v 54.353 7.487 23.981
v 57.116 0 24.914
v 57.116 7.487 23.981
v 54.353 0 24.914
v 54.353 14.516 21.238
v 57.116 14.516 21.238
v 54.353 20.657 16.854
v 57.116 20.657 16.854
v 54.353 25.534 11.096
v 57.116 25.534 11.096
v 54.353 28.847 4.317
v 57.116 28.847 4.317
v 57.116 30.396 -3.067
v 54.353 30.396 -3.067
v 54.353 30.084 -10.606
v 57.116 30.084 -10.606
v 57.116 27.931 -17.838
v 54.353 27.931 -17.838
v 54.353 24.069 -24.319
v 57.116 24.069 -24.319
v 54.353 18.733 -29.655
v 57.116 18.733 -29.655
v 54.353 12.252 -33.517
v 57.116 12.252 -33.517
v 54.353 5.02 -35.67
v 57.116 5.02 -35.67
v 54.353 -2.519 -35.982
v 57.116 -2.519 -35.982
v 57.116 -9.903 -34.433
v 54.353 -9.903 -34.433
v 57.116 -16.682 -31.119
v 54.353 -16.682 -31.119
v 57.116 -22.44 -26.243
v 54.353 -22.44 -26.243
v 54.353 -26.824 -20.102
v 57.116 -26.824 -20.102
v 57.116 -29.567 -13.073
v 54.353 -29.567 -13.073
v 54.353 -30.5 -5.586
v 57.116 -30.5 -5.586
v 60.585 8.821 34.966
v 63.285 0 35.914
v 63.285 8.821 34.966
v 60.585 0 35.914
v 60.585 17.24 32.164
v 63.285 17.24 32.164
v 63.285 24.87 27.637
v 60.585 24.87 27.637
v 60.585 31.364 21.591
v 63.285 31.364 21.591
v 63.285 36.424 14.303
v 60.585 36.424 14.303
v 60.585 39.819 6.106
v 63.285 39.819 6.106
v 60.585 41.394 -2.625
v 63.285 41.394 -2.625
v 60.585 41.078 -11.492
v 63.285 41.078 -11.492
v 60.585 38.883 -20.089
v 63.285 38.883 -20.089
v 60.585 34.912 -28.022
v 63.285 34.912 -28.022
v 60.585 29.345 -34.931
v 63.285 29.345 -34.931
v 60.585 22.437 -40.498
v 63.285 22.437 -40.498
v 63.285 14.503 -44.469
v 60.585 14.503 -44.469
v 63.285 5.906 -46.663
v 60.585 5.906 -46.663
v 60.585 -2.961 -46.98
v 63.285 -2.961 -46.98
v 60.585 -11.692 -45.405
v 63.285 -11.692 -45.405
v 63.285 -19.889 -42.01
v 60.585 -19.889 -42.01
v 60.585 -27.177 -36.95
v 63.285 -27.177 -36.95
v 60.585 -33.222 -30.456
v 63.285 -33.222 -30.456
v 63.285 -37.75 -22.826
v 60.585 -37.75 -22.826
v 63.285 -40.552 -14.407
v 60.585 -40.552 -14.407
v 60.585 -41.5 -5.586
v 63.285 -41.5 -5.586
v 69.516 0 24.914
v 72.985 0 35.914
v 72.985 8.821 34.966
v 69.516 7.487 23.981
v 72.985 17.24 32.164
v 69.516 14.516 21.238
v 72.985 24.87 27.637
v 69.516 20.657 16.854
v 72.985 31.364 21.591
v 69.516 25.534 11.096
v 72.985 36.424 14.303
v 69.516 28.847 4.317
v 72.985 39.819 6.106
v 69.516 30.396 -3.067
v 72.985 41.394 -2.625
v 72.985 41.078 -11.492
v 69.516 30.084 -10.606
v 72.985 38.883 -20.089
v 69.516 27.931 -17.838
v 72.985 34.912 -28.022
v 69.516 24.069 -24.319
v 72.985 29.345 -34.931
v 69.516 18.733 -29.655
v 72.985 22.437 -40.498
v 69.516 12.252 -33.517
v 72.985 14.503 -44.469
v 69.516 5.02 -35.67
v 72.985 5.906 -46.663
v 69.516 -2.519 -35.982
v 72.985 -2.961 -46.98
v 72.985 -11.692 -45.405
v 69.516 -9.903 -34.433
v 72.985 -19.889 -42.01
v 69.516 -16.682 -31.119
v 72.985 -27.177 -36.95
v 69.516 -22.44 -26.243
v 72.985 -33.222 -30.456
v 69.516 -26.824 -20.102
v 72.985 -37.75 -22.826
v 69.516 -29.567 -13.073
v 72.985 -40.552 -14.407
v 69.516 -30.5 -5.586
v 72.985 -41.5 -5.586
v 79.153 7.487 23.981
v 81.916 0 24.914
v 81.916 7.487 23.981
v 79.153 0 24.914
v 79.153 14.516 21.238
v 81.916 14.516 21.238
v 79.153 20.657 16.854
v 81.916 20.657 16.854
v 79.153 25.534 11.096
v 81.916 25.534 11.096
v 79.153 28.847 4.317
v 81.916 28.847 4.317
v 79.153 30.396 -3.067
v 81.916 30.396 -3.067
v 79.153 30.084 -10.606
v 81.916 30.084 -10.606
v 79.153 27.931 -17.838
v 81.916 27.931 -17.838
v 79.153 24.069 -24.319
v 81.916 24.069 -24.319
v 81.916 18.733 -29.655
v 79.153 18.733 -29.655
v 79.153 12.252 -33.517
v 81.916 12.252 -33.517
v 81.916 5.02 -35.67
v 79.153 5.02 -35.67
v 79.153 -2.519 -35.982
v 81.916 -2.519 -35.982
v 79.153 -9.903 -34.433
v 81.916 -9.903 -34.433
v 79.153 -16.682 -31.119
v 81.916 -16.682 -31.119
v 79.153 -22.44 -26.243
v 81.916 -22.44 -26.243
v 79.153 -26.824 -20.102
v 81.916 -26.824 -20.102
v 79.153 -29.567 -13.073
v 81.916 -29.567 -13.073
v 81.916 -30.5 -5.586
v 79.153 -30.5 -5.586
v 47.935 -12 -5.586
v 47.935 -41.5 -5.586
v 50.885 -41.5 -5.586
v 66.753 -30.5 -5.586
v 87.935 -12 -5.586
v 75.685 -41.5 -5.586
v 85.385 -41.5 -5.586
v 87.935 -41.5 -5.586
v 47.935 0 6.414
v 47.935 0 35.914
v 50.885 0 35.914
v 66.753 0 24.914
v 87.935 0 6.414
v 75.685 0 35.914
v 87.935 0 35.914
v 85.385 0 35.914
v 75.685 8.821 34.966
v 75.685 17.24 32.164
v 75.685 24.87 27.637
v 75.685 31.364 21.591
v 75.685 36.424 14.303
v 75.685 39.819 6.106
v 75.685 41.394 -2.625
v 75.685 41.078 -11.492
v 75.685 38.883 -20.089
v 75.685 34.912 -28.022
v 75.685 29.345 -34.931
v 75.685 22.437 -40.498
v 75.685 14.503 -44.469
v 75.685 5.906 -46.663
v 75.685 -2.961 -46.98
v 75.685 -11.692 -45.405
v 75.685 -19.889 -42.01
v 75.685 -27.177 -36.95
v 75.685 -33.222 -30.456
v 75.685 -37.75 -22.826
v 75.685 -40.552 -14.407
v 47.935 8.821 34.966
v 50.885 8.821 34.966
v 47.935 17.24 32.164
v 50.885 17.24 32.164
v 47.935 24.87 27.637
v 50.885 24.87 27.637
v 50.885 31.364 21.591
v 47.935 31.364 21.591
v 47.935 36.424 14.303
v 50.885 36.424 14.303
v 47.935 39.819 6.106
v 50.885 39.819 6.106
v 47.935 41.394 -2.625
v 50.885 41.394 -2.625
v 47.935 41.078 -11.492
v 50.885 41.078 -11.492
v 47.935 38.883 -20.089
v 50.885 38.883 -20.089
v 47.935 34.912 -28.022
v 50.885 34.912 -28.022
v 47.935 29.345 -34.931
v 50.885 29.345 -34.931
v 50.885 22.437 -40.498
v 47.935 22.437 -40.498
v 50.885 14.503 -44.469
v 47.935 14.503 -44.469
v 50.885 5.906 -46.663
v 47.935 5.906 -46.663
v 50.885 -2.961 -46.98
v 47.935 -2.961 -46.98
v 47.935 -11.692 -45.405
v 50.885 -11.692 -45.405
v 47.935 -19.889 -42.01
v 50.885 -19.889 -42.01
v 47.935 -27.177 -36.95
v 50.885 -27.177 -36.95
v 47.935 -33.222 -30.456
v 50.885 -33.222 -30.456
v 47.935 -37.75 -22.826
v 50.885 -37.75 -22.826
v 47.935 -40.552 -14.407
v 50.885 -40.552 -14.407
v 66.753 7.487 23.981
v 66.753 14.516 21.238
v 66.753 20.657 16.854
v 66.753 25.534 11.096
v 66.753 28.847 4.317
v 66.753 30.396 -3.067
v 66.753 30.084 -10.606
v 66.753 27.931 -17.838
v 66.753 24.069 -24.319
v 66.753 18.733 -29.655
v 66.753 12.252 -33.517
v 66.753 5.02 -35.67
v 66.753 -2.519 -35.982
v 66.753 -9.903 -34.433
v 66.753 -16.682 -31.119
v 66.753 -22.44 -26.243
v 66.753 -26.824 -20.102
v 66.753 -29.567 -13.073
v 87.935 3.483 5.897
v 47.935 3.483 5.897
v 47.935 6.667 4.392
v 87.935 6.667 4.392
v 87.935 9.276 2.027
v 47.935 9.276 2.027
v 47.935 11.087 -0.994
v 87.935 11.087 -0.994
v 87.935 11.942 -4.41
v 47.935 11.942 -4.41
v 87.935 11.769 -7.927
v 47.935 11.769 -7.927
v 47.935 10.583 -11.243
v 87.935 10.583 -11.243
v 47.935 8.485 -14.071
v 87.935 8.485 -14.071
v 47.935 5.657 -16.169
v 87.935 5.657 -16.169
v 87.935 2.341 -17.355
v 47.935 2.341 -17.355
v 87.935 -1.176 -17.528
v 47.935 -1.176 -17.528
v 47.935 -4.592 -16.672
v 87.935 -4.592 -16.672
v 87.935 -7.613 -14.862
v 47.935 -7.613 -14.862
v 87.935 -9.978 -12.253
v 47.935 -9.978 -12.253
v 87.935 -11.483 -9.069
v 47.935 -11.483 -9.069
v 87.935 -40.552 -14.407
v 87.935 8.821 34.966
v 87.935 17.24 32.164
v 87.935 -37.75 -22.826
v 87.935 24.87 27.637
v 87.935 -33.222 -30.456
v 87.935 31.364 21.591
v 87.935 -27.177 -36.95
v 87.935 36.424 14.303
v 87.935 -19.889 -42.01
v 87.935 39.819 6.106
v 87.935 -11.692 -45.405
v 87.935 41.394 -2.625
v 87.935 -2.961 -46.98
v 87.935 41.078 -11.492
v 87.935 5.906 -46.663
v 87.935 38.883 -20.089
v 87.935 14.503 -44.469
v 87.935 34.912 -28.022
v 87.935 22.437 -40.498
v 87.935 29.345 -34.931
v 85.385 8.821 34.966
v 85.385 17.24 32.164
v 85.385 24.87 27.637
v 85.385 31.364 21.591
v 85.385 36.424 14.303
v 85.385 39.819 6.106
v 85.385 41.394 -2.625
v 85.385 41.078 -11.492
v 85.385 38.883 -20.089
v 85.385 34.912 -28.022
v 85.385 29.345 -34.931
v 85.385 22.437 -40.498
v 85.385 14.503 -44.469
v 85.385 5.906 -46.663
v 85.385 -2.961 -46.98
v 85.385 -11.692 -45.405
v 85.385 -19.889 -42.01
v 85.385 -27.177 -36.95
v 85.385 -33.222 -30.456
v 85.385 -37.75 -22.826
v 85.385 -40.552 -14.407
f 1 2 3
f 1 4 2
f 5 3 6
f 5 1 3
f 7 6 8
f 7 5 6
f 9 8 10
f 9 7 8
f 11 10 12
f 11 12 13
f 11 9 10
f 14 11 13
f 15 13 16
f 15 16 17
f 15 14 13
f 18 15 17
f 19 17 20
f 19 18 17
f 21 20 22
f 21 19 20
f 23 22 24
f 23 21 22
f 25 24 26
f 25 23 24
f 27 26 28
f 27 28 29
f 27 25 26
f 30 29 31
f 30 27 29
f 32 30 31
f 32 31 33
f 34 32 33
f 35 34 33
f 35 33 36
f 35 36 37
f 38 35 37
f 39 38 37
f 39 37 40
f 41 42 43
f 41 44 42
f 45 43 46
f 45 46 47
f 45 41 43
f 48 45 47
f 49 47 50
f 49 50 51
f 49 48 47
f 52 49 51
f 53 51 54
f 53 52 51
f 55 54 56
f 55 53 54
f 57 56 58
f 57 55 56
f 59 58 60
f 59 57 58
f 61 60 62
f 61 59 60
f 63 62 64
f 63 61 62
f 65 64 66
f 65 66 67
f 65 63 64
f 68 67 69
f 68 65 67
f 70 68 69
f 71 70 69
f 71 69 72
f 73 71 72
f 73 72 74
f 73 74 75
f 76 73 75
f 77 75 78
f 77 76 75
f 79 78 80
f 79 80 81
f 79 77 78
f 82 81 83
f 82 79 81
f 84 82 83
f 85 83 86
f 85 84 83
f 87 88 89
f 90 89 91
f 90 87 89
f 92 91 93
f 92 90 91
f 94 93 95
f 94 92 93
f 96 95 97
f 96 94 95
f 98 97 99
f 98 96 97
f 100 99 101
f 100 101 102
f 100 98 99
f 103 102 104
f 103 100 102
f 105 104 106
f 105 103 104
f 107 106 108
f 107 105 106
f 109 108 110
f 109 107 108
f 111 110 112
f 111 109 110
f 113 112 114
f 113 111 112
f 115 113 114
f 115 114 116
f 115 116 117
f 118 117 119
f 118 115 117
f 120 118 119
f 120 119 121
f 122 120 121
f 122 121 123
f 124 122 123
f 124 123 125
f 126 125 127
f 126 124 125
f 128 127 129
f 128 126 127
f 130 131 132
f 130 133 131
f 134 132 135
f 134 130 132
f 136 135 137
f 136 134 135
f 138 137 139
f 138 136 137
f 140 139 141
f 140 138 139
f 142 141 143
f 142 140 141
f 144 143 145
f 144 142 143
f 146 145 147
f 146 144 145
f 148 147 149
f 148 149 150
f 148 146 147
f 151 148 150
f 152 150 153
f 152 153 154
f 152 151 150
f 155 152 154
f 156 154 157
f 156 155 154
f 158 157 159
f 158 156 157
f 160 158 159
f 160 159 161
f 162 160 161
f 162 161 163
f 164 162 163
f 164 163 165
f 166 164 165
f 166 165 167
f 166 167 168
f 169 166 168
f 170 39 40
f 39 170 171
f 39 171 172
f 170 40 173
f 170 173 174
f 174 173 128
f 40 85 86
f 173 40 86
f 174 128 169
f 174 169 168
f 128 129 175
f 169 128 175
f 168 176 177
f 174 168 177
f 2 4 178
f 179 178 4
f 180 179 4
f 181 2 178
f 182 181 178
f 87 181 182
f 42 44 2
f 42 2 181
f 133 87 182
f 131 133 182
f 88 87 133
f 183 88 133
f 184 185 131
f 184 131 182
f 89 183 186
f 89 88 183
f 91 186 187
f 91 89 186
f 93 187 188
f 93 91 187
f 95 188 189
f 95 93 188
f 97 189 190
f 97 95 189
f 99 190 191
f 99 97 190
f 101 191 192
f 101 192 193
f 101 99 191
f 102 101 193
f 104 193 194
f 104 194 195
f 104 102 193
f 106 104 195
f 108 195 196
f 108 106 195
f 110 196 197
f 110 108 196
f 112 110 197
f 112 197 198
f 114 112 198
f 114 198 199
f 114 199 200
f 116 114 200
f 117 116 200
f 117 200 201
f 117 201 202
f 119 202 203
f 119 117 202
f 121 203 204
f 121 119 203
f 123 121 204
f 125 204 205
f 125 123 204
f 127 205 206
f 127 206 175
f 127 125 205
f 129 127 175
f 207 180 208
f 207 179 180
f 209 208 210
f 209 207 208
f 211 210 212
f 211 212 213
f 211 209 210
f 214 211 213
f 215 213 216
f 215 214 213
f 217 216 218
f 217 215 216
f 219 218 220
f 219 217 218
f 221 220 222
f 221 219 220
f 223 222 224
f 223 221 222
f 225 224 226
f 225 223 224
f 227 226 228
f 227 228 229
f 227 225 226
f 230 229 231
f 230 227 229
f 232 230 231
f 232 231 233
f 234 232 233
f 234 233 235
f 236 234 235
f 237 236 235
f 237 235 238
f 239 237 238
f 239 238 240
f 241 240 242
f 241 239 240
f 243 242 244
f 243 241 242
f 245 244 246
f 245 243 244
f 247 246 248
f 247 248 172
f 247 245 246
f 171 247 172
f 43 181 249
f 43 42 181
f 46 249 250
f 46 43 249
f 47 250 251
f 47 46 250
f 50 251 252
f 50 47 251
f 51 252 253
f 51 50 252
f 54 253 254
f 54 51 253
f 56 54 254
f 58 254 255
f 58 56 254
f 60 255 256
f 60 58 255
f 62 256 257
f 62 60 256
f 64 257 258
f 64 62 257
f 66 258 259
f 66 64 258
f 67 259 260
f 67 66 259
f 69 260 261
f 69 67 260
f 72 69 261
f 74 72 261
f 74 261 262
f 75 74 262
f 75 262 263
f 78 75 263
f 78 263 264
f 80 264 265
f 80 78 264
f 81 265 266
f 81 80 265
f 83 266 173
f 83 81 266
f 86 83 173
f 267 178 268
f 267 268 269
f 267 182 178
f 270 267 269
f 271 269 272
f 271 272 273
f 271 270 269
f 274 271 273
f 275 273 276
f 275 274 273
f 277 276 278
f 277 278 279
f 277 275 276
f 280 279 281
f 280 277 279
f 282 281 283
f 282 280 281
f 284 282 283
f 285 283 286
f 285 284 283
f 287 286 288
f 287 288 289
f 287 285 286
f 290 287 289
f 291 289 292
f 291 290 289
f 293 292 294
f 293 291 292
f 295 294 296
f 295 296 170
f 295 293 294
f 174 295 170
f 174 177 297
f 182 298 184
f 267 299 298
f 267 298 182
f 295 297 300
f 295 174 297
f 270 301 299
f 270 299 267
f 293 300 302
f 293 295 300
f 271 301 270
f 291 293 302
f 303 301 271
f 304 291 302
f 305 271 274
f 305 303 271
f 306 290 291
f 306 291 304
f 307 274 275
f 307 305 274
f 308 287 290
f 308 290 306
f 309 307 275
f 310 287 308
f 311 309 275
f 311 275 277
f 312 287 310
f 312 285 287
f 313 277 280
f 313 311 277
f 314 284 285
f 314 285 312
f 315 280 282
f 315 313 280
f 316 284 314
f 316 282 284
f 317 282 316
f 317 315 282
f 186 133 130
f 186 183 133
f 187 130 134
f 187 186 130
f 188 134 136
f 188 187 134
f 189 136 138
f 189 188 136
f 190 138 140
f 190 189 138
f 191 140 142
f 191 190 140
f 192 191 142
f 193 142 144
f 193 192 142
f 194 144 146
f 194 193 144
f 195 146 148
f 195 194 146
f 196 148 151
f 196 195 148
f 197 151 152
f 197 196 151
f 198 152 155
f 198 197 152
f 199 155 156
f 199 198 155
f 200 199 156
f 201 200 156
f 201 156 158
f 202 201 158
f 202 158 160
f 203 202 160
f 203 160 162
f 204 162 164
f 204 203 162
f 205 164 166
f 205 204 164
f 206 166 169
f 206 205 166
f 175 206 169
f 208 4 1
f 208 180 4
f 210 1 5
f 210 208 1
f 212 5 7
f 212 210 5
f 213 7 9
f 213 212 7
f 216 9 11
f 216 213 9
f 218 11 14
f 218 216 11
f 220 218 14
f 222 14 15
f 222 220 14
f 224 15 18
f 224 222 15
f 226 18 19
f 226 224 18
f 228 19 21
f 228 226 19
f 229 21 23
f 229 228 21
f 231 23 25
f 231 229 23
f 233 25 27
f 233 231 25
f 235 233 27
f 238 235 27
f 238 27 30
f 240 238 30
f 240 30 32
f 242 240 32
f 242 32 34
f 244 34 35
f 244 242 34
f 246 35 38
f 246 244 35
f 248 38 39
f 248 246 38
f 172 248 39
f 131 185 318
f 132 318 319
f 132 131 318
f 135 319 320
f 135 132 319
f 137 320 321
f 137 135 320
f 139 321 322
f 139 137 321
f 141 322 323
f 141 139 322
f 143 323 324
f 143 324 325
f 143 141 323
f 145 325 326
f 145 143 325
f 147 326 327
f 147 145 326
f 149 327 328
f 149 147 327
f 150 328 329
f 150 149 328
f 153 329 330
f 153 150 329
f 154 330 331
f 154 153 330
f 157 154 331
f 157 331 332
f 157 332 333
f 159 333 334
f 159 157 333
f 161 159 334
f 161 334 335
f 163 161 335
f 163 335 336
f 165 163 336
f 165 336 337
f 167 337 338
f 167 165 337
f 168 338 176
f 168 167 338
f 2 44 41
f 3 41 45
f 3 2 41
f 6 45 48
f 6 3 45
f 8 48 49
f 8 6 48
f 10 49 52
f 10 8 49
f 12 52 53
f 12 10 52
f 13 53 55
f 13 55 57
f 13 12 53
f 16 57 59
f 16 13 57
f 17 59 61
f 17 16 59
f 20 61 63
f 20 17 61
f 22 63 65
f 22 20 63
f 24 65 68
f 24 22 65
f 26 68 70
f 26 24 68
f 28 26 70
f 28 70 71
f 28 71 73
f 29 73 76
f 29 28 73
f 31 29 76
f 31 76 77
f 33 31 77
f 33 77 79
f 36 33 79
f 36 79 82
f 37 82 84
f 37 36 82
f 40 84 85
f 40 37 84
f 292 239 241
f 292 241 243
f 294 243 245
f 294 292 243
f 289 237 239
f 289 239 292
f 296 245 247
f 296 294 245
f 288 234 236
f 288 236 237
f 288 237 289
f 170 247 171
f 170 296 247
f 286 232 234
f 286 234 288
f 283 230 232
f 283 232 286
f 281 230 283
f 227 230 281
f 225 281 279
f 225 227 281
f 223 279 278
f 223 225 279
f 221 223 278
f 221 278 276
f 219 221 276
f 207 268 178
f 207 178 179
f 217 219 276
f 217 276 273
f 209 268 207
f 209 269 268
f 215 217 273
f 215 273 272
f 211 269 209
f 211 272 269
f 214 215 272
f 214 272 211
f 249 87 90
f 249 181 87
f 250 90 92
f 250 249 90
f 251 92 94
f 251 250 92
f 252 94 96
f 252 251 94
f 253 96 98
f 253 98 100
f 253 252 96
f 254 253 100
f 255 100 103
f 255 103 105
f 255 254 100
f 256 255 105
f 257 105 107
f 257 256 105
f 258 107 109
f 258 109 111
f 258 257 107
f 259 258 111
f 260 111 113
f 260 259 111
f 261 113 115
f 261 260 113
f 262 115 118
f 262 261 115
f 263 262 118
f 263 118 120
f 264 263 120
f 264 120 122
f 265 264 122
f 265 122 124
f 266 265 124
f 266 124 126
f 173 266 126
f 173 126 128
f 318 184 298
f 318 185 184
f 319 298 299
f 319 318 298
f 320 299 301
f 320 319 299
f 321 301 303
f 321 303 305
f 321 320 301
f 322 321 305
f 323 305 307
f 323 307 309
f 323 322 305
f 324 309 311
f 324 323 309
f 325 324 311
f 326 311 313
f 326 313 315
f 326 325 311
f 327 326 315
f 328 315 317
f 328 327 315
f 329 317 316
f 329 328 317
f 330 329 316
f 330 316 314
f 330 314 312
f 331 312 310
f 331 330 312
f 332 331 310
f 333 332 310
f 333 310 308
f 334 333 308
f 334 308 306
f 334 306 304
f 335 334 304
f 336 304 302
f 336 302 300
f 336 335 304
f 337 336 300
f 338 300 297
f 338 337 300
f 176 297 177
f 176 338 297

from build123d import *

# Parameters (mm, degrees)
F0_W     = 40
F0_H     = 3.3
F1_ANGLE = 270


with BuildPart() as f1:
    # F0 (on Front) → F1 (revolve)
    with BuildSketch(Plane.XZ):
        Polygon((63.284774, 35.914096), (60.584774, 35.914096), (57.116487, 24.914096), (54.353061, 24.914096), (50.884774, 35.914096), (47.934774, 35.914096), (47.934774, 9.714096), (87.934774, 9.714096), (87.934774, 35.914096), (85.384774, 35.914096), (81.916487, 24.914096), (79.153061, 24.914096), (75.684774, 35.914096), (72.984774, 35.914096), (69.516487, 24.914096), (66.753061, 24.914096), align=None)
        with Locations((67.934774, 8.064096)):
            Rectangle(F0_W, F0_H)
    revolve(axis=Axis((67.934774, 0, -5.585904), (-1, 0, 0)), revolution_arc=F1_ANGLE)


solid = f1.part
